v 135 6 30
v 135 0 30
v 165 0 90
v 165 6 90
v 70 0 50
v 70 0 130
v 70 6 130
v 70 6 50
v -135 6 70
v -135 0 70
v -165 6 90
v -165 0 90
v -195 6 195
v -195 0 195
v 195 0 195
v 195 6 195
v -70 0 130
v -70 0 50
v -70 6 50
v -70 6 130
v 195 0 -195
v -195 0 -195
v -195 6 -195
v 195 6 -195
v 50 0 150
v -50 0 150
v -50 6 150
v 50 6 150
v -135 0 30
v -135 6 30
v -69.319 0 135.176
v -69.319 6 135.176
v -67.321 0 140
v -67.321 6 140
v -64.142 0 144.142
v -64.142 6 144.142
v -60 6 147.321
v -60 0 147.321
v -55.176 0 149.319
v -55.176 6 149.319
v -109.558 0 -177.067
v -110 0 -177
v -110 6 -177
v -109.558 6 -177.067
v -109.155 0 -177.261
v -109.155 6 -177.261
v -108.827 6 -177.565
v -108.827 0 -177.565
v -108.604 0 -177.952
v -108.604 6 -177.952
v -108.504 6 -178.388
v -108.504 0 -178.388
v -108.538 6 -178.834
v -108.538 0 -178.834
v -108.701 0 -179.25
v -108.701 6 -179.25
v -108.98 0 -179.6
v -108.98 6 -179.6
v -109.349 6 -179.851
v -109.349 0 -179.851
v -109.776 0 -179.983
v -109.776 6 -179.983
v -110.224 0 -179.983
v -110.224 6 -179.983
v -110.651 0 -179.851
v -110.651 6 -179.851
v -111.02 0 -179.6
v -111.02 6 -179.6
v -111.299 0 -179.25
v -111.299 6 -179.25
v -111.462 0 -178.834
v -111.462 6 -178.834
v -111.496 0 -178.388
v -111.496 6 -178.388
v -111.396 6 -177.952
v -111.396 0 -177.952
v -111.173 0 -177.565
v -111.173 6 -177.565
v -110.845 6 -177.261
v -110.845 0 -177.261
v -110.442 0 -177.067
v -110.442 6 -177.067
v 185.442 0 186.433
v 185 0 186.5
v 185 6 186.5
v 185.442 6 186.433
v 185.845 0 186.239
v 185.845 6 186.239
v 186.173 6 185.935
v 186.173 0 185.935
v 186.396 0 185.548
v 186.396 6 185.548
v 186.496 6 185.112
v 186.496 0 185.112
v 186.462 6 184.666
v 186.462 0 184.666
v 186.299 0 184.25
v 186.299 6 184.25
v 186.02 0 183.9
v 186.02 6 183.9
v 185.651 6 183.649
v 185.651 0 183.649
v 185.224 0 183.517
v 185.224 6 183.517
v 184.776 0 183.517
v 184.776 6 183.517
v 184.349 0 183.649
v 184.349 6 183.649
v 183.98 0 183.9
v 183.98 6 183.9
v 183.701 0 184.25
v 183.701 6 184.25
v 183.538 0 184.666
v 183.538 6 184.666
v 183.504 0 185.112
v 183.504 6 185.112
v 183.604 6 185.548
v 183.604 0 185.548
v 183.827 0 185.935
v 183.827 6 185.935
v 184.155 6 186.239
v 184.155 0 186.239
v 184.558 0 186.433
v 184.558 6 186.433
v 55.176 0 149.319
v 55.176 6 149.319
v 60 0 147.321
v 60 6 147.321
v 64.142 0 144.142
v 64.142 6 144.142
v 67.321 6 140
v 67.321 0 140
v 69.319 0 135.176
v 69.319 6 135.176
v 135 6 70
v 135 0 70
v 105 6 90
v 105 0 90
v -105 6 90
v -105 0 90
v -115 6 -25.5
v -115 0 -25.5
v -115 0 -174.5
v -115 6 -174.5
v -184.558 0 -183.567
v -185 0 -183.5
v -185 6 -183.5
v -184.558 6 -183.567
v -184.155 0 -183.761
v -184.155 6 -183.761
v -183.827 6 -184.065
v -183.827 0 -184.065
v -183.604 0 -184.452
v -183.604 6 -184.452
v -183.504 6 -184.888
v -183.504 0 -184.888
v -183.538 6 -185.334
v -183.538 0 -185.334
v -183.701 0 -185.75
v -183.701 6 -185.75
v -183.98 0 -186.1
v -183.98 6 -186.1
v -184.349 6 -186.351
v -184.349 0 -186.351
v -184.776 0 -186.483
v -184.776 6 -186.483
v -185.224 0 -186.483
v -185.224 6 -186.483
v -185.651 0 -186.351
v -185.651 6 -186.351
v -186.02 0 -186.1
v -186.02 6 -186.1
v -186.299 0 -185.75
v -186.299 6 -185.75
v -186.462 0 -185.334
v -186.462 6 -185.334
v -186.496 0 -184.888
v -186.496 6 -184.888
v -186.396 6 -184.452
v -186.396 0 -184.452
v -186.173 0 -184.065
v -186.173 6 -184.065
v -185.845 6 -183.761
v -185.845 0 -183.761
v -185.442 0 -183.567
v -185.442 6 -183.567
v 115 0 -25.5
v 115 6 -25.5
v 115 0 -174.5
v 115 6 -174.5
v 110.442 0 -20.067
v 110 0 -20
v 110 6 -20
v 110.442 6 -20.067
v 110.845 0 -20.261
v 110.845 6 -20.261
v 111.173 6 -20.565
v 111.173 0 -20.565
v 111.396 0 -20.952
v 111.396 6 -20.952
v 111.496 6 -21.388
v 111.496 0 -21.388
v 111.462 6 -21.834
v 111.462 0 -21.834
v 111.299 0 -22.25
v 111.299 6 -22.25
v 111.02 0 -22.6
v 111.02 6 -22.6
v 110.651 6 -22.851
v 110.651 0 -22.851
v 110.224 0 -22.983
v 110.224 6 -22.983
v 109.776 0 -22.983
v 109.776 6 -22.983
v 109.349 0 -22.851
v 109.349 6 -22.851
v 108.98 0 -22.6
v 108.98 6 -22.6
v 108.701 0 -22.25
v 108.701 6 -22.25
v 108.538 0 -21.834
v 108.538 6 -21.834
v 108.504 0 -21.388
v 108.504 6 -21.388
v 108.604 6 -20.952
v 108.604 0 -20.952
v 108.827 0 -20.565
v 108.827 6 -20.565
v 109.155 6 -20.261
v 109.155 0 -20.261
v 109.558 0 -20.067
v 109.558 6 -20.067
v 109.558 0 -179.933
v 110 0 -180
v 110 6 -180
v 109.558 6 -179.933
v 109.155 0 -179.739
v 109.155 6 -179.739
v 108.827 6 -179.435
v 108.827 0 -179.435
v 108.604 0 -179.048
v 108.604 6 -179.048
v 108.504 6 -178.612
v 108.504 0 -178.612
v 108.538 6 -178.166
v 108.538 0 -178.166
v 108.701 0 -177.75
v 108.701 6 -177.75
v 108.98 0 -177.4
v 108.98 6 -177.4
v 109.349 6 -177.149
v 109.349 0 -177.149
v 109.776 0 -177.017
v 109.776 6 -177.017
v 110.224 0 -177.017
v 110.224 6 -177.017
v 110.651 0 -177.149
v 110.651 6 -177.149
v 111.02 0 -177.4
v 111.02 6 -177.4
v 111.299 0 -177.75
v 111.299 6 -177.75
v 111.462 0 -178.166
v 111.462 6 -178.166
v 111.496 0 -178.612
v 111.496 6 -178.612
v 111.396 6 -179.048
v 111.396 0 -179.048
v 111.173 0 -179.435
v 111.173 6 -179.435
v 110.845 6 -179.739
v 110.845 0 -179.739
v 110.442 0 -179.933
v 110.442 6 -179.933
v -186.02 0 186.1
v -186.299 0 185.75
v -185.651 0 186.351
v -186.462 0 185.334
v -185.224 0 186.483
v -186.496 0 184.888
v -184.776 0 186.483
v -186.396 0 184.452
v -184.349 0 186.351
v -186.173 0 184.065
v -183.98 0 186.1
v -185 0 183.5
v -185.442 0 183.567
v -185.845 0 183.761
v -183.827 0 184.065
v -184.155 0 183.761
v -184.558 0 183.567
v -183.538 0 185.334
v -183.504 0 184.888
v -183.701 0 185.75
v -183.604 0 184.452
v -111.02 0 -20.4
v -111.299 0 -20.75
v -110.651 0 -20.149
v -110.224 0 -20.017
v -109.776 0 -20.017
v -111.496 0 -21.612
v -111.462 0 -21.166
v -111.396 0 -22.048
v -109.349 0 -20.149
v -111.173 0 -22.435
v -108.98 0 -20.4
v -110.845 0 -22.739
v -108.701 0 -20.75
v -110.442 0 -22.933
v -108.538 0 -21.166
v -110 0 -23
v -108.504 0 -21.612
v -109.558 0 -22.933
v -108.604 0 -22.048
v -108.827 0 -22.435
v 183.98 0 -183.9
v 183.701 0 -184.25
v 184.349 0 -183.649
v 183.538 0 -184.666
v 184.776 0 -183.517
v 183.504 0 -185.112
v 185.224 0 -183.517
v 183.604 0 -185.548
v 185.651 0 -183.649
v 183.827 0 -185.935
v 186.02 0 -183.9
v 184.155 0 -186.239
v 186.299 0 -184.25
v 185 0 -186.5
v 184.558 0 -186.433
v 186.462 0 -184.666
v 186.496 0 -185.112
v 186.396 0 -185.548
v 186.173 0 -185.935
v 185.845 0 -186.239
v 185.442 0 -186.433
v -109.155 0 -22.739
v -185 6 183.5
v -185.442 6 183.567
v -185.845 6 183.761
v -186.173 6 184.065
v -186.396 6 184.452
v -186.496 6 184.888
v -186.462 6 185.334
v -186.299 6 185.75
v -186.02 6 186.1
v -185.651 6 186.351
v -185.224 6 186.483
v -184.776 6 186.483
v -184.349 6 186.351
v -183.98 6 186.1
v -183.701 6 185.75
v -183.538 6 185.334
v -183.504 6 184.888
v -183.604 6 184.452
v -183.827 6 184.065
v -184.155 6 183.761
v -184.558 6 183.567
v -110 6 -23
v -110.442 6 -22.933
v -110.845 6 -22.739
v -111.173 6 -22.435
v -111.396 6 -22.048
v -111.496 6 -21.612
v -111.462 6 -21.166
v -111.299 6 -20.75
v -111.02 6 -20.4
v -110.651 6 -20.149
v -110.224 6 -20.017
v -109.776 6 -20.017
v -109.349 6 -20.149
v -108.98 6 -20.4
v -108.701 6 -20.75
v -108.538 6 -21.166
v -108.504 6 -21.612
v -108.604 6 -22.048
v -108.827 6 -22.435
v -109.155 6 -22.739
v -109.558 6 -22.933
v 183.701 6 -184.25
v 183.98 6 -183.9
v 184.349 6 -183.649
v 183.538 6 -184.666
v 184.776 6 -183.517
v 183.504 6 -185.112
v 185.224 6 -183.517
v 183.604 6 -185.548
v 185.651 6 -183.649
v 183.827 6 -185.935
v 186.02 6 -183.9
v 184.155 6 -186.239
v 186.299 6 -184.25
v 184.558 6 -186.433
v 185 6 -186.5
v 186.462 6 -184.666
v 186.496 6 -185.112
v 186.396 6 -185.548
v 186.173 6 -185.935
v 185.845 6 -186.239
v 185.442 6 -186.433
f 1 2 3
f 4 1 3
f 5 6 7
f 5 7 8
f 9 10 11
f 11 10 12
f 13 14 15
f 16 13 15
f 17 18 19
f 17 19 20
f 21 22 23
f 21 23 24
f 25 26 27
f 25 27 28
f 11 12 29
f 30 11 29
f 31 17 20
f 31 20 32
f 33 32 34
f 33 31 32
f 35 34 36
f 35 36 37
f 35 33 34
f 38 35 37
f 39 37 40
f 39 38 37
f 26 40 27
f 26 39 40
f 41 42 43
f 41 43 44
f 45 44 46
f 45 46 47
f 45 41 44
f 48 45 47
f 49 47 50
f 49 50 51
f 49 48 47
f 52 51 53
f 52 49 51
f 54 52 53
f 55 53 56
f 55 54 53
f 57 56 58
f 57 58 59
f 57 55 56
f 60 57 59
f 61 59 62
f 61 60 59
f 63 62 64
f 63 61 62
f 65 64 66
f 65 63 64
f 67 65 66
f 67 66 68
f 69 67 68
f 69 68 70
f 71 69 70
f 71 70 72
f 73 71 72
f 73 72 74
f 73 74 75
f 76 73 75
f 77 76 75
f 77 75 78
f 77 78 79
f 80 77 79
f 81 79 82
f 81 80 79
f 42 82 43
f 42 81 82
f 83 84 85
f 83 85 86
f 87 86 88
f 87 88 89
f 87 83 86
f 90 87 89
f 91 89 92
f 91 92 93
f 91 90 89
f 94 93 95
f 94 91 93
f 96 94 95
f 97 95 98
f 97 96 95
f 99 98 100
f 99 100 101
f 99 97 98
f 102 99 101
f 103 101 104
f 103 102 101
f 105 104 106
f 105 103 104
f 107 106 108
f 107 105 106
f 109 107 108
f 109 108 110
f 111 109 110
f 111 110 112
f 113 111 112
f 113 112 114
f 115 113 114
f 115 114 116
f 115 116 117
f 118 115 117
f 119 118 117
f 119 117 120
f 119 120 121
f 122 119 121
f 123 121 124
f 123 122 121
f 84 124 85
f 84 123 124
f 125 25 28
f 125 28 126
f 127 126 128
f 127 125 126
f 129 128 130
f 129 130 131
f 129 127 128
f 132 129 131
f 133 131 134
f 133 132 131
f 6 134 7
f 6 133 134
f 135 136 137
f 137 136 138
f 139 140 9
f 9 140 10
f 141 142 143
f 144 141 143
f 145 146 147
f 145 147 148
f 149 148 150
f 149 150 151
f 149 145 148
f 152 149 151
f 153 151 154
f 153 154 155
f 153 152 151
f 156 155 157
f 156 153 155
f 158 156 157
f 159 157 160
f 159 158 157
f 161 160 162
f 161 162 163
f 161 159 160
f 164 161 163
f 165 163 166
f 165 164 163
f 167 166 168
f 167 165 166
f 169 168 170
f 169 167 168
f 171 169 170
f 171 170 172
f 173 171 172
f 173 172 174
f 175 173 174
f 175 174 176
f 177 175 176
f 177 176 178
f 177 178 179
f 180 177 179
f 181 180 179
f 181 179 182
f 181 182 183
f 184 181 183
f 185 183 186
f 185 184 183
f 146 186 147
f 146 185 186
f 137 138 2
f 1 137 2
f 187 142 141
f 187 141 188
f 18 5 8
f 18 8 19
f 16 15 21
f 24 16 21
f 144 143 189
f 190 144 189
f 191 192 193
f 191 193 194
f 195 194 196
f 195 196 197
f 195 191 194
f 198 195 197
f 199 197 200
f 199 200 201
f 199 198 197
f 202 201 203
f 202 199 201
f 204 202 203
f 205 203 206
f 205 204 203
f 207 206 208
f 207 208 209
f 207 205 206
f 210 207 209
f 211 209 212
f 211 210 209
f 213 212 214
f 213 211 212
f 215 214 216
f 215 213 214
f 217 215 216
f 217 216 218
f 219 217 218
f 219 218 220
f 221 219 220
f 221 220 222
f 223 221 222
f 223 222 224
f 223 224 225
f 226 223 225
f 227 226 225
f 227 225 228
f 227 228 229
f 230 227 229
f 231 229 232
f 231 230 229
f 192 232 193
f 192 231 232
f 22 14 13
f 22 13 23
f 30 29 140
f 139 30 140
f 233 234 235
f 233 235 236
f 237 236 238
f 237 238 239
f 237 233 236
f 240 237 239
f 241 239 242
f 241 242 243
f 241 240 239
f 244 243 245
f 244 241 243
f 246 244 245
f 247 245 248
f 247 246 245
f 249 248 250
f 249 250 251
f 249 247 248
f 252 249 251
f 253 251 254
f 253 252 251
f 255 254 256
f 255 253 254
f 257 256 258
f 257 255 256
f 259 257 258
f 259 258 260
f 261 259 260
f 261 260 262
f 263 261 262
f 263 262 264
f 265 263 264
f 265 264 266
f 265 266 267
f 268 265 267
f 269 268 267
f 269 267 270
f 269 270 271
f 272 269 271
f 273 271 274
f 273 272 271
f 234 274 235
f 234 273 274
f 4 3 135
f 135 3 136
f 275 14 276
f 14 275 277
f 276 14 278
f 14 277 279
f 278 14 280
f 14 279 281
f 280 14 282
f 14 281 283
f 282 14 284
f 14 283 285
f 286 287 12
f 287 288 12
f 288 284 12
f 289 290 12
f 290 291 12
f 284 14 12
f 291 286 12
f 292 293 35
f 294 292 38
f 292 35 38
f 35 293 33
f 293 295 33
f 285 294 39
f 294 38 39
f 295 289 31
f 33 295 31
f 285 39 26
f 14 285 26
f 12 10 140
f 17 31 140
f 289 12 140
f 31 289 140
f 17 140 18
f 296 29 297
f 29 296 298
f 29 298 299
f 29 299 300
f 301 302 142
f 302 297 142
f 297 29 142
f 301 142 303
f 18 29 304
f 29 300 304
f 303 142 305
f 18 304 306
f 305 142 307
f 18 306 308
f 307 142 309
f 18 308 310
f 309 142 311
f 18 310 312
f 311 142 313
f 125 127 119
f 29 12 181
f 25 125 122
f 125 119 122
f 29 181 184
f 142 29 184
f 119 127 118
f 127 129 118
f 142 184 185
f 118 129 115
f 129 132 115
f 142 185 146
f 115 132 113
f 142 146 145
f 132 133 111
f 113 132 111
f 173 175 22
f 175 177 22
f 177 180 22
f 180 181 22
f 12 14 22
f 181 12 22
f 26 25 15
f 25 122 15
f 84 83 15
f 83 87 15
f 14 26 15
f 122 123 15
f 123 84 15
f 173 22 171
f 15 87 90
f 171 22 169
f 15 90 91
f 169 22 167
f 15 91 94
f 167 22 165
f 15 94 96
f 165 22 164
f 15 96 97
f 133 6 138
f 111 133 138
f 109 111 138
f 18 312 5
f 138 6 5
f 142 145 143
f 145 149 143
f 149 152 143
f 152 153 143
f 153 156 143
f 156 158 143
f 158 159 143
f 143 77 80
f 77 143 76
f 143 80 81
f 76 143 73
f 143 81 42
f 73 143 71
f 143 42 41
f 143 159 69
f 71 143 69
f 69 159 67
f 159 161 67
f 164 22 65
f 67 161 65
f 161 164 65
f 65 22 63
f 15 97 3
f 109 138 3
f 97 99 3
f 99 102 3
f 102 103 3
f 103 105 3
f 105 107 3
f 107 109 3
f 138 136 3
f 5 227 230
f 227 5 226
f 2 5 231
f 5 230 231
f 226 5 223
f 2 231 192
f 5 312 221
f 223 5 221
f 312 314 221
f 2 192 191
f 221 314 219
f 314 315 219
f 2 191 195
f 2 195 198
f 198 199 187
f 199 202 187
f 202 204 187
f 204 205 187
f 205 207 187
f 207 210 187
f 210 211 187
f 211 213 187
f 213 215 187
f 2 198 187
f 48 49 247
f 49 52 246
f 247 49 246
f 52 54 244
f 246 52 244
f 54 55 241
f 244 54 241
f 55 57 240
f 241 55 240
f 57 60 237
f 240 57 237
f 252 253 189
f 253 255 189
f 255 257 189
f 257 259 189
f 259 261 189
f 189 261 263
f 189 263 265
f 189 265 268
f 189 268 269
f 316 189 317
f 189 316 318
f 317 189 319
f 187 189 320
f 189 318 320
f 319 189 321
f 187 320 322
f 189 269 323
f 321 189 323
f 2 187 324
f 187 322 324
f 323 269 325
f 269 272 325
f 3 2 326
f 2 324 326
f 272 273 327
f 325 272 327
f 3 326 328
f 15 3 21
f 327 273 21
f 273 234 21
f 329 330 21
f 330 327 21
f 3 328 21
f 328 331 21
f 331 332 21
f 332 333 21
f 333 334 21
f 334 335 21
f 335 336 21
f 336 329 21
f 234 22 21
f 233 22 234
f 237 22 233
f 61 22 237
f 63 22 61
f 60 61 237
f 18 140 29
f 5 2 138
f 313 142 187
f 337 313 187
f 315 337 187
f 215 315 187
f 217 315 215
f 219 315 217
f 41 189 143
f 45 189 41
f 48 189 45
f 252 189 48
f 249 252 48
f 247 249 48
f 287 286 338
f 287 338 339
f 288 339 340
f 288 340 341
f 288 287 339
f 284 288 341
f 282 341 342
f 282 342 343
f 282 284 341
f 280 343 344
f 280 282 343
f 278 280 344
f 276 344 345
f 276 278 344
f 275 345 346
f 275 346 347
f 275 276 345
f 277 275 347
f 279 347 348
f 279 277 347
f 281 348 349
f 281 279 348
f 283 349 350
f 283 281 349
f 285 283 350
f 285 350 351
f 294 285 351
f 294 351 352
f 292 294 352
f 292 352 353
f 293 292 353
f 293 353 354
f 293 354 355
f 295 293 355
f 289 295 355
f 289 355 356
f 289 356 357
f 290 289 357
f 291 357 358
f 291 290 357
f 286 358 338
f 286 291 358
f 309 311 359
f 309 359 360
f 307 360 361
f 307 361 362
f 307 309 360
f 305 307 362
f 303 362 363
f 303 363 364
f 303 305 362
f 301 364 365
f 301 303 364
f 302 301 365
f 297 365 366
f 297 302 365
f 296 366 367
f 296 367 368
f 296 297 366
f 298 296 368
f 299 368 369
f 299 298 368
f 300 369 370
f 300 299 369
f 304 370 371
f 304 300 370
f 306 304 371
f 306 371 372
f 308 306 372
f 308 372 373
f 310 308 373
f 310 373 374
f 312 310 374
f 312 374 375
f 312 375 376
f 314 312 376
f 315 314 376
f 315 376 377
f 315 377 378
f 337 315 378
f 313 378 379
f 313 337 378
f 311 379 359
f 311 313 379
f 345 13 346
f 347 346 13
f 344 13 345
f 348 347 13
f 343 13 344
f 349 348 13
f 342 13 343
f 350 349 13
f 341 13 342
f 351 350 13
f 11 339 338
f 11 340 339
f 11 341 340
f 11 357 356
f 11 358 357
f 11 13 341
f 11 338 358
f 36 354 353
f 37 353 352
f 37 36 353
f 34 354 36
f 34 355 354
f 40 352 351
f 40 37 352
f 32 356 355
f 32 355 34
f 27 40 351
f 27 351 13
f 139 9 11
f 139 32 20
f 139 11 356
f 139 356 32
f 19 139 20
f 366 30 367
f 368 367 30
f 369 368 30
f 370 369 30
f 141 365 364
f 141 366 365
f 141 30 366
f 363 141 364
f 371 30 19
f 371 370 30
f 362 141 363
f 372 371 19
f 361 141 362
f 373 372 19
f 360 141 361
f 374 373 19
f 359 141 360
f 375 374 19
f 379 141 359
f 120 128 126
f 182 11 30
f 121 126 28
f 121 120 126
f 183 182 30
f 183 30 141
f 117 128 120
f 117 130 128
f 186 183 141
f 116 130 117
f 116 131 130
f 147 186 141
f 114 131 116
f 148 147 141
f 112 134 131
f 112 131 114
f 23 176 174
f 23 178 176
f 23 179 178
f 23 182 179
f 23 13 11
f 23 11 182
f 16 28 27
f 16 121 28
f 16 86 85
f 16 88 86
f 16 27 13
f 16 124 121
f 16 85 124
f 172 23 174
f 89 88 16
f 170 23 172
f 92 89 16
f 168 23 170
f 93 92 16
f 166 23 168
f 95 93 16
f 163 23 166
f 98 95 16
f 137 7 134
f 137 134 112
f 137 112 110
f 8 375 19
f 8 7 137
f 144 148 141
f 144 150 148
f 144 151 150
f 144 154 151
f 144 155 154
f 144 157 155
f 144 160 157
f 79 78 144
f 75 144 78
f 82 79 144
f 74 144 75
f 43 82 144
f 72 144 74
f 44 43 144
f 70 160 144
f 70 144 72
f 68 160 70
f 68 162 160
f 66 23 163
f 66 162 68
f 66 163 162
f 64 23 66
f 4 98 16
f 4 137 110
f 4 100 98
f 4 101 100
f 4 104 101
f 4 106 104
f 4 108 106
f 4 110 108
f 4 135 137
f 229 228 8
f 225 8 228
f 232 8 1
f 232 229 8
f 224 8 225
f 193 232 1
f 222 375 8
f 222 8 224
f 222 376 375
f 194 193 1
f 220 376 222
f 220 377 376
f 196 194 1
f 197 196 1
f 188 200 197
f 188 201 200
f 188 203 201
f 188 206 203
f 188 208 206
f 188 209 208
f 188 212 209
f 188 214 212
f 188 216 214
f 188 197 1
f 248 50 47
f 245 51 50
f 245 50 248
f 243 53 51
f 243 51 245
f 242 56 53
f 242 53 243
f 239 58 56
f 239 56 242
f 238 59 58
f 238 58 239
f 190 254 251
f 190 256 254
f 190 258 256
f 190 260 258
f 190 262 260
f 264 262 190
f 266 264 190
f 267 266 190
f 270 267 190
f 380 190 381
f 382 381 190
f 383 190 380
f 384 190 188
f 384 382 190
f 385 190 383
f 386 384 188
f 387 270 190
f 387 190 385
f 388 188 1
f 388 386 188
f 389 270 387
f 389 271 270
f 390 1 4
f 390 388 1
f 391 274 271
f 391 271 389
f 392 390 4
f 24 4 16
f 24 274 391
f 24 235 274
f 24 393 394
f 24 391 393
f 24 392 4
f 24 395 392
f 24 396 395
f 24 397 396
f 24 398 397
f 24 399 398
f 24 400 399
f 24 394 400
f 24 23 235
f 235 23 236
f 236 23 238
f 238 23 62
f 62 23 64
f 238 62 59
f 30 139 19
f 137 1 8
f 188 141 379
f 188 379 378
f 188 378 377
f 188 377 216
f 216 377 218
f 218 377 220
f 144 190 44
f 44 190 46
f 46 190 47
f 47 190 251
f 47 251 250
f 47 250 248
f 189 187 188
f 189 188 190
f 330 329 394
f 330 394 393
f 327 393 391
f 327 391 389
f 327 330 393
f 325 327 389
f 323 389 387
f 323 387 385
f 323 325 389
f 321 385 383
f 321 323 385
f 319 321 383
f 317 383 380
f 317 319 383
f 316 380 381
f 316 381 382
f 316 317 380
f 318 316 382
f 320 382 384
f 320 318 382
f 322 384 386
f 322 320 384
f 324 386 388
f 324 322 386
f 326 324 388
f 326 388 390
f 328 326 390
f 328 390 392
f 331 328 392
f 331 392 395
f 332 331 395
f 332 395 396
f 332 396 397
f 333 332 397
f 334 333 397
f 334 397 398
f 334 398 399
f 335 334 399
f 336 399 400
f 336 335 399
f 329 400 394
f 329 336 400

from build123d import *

# Parameters (mm, degrees)
SKETCH_1_W         = 390
SKETCH_1_H         = 390
SKETCH_1_R         = 1.5
SKETCH_1_W_2       = 230
SKETCH_1_H_2       = 149
EXTRUDE_1081_DEPTH = 6


with BuildPart() as part:
    # 草图1 → Extrude 1081 (new body)
    with BuildSketch(Plane(origin=(0, 0, 0), x_dir=(1, 0, 0), z_dir=(0, 1, 0))):
        Rectangle(SKETCH_1_W, SKETCH_1_H)
        with Locations(Location((-110, 178.5, 0), (0, 0, 270))):
            Circle(SKETCH_1_R, mode=Mode.SUBTRACT)
        with Locations(Location((-110, 21.5, 0), (0, 0, 90))):
            Circle(SKETCH_1_R, mode=Mode.SUBTRACT)
        with Locations(Location((110, 21.5, 0), (0, 0, 270))):
            Circle(SKETCH_1_R, mode=Mode.SUBTRACT)
        with Locations(Location((110, 178.5, 0), (0, 0, 90))):
            Circle(SKETCH_1_R, mode=Mode.SUBTRACT)
        with Locations(Location((-185, 185, 0), (0, 0, 270))):
            Circle(SKETCH_1_R, mode=Mode.SUBTRACT)
        with Locations(Location((-185, -185, 0), (0, 0, 90))):
            Circle(SKETCH_1_R, mode=Mode.SUBTRACT)
        with Locations(Location((185, -185, 0), (0, 0, 270))):
            Circle(SKETCH_1_R, mode=Mode.SUBTRACT)
        with Locations(Location((185, 185, 0), (0, 0, 90))):
            Circle(SKETCH_1_R, mode=Mode.SUBTRACT)
        with Locations((0, 100)):
            Rectangle(SKETCH_1_W_2, SKETCH_1_H_2, mode=Mode.SUBTRACT)
        with BuildLine():
            Line((-50, -150), (50, -150))
            ThreePointArc((50, -150), (64.142135624, -144.142135624), (70, -130))
            Line((70, -130), (70, -50))
            Line((70, -50), (-70, -50))
            Line((-70, -50), (-70, -130))
            ThreePointArc((-70, -130), (-64.142135624, -144.142135624), (-50, -150))
        make_face(mode=Mode.SUBTRACT)
        Polygon((-165, -90), (-135, -30), (-105, -90), (-135, -70), align=None, mode=Mode.SUBTRACT)
        Polygon((105, -90), (135, -30), (165, -90), (135, -70), align=None, mode=Mode.SUBTRACT)
    extrude(amount=EXTRUDE_1081_DEPTH)


solid = part.part
